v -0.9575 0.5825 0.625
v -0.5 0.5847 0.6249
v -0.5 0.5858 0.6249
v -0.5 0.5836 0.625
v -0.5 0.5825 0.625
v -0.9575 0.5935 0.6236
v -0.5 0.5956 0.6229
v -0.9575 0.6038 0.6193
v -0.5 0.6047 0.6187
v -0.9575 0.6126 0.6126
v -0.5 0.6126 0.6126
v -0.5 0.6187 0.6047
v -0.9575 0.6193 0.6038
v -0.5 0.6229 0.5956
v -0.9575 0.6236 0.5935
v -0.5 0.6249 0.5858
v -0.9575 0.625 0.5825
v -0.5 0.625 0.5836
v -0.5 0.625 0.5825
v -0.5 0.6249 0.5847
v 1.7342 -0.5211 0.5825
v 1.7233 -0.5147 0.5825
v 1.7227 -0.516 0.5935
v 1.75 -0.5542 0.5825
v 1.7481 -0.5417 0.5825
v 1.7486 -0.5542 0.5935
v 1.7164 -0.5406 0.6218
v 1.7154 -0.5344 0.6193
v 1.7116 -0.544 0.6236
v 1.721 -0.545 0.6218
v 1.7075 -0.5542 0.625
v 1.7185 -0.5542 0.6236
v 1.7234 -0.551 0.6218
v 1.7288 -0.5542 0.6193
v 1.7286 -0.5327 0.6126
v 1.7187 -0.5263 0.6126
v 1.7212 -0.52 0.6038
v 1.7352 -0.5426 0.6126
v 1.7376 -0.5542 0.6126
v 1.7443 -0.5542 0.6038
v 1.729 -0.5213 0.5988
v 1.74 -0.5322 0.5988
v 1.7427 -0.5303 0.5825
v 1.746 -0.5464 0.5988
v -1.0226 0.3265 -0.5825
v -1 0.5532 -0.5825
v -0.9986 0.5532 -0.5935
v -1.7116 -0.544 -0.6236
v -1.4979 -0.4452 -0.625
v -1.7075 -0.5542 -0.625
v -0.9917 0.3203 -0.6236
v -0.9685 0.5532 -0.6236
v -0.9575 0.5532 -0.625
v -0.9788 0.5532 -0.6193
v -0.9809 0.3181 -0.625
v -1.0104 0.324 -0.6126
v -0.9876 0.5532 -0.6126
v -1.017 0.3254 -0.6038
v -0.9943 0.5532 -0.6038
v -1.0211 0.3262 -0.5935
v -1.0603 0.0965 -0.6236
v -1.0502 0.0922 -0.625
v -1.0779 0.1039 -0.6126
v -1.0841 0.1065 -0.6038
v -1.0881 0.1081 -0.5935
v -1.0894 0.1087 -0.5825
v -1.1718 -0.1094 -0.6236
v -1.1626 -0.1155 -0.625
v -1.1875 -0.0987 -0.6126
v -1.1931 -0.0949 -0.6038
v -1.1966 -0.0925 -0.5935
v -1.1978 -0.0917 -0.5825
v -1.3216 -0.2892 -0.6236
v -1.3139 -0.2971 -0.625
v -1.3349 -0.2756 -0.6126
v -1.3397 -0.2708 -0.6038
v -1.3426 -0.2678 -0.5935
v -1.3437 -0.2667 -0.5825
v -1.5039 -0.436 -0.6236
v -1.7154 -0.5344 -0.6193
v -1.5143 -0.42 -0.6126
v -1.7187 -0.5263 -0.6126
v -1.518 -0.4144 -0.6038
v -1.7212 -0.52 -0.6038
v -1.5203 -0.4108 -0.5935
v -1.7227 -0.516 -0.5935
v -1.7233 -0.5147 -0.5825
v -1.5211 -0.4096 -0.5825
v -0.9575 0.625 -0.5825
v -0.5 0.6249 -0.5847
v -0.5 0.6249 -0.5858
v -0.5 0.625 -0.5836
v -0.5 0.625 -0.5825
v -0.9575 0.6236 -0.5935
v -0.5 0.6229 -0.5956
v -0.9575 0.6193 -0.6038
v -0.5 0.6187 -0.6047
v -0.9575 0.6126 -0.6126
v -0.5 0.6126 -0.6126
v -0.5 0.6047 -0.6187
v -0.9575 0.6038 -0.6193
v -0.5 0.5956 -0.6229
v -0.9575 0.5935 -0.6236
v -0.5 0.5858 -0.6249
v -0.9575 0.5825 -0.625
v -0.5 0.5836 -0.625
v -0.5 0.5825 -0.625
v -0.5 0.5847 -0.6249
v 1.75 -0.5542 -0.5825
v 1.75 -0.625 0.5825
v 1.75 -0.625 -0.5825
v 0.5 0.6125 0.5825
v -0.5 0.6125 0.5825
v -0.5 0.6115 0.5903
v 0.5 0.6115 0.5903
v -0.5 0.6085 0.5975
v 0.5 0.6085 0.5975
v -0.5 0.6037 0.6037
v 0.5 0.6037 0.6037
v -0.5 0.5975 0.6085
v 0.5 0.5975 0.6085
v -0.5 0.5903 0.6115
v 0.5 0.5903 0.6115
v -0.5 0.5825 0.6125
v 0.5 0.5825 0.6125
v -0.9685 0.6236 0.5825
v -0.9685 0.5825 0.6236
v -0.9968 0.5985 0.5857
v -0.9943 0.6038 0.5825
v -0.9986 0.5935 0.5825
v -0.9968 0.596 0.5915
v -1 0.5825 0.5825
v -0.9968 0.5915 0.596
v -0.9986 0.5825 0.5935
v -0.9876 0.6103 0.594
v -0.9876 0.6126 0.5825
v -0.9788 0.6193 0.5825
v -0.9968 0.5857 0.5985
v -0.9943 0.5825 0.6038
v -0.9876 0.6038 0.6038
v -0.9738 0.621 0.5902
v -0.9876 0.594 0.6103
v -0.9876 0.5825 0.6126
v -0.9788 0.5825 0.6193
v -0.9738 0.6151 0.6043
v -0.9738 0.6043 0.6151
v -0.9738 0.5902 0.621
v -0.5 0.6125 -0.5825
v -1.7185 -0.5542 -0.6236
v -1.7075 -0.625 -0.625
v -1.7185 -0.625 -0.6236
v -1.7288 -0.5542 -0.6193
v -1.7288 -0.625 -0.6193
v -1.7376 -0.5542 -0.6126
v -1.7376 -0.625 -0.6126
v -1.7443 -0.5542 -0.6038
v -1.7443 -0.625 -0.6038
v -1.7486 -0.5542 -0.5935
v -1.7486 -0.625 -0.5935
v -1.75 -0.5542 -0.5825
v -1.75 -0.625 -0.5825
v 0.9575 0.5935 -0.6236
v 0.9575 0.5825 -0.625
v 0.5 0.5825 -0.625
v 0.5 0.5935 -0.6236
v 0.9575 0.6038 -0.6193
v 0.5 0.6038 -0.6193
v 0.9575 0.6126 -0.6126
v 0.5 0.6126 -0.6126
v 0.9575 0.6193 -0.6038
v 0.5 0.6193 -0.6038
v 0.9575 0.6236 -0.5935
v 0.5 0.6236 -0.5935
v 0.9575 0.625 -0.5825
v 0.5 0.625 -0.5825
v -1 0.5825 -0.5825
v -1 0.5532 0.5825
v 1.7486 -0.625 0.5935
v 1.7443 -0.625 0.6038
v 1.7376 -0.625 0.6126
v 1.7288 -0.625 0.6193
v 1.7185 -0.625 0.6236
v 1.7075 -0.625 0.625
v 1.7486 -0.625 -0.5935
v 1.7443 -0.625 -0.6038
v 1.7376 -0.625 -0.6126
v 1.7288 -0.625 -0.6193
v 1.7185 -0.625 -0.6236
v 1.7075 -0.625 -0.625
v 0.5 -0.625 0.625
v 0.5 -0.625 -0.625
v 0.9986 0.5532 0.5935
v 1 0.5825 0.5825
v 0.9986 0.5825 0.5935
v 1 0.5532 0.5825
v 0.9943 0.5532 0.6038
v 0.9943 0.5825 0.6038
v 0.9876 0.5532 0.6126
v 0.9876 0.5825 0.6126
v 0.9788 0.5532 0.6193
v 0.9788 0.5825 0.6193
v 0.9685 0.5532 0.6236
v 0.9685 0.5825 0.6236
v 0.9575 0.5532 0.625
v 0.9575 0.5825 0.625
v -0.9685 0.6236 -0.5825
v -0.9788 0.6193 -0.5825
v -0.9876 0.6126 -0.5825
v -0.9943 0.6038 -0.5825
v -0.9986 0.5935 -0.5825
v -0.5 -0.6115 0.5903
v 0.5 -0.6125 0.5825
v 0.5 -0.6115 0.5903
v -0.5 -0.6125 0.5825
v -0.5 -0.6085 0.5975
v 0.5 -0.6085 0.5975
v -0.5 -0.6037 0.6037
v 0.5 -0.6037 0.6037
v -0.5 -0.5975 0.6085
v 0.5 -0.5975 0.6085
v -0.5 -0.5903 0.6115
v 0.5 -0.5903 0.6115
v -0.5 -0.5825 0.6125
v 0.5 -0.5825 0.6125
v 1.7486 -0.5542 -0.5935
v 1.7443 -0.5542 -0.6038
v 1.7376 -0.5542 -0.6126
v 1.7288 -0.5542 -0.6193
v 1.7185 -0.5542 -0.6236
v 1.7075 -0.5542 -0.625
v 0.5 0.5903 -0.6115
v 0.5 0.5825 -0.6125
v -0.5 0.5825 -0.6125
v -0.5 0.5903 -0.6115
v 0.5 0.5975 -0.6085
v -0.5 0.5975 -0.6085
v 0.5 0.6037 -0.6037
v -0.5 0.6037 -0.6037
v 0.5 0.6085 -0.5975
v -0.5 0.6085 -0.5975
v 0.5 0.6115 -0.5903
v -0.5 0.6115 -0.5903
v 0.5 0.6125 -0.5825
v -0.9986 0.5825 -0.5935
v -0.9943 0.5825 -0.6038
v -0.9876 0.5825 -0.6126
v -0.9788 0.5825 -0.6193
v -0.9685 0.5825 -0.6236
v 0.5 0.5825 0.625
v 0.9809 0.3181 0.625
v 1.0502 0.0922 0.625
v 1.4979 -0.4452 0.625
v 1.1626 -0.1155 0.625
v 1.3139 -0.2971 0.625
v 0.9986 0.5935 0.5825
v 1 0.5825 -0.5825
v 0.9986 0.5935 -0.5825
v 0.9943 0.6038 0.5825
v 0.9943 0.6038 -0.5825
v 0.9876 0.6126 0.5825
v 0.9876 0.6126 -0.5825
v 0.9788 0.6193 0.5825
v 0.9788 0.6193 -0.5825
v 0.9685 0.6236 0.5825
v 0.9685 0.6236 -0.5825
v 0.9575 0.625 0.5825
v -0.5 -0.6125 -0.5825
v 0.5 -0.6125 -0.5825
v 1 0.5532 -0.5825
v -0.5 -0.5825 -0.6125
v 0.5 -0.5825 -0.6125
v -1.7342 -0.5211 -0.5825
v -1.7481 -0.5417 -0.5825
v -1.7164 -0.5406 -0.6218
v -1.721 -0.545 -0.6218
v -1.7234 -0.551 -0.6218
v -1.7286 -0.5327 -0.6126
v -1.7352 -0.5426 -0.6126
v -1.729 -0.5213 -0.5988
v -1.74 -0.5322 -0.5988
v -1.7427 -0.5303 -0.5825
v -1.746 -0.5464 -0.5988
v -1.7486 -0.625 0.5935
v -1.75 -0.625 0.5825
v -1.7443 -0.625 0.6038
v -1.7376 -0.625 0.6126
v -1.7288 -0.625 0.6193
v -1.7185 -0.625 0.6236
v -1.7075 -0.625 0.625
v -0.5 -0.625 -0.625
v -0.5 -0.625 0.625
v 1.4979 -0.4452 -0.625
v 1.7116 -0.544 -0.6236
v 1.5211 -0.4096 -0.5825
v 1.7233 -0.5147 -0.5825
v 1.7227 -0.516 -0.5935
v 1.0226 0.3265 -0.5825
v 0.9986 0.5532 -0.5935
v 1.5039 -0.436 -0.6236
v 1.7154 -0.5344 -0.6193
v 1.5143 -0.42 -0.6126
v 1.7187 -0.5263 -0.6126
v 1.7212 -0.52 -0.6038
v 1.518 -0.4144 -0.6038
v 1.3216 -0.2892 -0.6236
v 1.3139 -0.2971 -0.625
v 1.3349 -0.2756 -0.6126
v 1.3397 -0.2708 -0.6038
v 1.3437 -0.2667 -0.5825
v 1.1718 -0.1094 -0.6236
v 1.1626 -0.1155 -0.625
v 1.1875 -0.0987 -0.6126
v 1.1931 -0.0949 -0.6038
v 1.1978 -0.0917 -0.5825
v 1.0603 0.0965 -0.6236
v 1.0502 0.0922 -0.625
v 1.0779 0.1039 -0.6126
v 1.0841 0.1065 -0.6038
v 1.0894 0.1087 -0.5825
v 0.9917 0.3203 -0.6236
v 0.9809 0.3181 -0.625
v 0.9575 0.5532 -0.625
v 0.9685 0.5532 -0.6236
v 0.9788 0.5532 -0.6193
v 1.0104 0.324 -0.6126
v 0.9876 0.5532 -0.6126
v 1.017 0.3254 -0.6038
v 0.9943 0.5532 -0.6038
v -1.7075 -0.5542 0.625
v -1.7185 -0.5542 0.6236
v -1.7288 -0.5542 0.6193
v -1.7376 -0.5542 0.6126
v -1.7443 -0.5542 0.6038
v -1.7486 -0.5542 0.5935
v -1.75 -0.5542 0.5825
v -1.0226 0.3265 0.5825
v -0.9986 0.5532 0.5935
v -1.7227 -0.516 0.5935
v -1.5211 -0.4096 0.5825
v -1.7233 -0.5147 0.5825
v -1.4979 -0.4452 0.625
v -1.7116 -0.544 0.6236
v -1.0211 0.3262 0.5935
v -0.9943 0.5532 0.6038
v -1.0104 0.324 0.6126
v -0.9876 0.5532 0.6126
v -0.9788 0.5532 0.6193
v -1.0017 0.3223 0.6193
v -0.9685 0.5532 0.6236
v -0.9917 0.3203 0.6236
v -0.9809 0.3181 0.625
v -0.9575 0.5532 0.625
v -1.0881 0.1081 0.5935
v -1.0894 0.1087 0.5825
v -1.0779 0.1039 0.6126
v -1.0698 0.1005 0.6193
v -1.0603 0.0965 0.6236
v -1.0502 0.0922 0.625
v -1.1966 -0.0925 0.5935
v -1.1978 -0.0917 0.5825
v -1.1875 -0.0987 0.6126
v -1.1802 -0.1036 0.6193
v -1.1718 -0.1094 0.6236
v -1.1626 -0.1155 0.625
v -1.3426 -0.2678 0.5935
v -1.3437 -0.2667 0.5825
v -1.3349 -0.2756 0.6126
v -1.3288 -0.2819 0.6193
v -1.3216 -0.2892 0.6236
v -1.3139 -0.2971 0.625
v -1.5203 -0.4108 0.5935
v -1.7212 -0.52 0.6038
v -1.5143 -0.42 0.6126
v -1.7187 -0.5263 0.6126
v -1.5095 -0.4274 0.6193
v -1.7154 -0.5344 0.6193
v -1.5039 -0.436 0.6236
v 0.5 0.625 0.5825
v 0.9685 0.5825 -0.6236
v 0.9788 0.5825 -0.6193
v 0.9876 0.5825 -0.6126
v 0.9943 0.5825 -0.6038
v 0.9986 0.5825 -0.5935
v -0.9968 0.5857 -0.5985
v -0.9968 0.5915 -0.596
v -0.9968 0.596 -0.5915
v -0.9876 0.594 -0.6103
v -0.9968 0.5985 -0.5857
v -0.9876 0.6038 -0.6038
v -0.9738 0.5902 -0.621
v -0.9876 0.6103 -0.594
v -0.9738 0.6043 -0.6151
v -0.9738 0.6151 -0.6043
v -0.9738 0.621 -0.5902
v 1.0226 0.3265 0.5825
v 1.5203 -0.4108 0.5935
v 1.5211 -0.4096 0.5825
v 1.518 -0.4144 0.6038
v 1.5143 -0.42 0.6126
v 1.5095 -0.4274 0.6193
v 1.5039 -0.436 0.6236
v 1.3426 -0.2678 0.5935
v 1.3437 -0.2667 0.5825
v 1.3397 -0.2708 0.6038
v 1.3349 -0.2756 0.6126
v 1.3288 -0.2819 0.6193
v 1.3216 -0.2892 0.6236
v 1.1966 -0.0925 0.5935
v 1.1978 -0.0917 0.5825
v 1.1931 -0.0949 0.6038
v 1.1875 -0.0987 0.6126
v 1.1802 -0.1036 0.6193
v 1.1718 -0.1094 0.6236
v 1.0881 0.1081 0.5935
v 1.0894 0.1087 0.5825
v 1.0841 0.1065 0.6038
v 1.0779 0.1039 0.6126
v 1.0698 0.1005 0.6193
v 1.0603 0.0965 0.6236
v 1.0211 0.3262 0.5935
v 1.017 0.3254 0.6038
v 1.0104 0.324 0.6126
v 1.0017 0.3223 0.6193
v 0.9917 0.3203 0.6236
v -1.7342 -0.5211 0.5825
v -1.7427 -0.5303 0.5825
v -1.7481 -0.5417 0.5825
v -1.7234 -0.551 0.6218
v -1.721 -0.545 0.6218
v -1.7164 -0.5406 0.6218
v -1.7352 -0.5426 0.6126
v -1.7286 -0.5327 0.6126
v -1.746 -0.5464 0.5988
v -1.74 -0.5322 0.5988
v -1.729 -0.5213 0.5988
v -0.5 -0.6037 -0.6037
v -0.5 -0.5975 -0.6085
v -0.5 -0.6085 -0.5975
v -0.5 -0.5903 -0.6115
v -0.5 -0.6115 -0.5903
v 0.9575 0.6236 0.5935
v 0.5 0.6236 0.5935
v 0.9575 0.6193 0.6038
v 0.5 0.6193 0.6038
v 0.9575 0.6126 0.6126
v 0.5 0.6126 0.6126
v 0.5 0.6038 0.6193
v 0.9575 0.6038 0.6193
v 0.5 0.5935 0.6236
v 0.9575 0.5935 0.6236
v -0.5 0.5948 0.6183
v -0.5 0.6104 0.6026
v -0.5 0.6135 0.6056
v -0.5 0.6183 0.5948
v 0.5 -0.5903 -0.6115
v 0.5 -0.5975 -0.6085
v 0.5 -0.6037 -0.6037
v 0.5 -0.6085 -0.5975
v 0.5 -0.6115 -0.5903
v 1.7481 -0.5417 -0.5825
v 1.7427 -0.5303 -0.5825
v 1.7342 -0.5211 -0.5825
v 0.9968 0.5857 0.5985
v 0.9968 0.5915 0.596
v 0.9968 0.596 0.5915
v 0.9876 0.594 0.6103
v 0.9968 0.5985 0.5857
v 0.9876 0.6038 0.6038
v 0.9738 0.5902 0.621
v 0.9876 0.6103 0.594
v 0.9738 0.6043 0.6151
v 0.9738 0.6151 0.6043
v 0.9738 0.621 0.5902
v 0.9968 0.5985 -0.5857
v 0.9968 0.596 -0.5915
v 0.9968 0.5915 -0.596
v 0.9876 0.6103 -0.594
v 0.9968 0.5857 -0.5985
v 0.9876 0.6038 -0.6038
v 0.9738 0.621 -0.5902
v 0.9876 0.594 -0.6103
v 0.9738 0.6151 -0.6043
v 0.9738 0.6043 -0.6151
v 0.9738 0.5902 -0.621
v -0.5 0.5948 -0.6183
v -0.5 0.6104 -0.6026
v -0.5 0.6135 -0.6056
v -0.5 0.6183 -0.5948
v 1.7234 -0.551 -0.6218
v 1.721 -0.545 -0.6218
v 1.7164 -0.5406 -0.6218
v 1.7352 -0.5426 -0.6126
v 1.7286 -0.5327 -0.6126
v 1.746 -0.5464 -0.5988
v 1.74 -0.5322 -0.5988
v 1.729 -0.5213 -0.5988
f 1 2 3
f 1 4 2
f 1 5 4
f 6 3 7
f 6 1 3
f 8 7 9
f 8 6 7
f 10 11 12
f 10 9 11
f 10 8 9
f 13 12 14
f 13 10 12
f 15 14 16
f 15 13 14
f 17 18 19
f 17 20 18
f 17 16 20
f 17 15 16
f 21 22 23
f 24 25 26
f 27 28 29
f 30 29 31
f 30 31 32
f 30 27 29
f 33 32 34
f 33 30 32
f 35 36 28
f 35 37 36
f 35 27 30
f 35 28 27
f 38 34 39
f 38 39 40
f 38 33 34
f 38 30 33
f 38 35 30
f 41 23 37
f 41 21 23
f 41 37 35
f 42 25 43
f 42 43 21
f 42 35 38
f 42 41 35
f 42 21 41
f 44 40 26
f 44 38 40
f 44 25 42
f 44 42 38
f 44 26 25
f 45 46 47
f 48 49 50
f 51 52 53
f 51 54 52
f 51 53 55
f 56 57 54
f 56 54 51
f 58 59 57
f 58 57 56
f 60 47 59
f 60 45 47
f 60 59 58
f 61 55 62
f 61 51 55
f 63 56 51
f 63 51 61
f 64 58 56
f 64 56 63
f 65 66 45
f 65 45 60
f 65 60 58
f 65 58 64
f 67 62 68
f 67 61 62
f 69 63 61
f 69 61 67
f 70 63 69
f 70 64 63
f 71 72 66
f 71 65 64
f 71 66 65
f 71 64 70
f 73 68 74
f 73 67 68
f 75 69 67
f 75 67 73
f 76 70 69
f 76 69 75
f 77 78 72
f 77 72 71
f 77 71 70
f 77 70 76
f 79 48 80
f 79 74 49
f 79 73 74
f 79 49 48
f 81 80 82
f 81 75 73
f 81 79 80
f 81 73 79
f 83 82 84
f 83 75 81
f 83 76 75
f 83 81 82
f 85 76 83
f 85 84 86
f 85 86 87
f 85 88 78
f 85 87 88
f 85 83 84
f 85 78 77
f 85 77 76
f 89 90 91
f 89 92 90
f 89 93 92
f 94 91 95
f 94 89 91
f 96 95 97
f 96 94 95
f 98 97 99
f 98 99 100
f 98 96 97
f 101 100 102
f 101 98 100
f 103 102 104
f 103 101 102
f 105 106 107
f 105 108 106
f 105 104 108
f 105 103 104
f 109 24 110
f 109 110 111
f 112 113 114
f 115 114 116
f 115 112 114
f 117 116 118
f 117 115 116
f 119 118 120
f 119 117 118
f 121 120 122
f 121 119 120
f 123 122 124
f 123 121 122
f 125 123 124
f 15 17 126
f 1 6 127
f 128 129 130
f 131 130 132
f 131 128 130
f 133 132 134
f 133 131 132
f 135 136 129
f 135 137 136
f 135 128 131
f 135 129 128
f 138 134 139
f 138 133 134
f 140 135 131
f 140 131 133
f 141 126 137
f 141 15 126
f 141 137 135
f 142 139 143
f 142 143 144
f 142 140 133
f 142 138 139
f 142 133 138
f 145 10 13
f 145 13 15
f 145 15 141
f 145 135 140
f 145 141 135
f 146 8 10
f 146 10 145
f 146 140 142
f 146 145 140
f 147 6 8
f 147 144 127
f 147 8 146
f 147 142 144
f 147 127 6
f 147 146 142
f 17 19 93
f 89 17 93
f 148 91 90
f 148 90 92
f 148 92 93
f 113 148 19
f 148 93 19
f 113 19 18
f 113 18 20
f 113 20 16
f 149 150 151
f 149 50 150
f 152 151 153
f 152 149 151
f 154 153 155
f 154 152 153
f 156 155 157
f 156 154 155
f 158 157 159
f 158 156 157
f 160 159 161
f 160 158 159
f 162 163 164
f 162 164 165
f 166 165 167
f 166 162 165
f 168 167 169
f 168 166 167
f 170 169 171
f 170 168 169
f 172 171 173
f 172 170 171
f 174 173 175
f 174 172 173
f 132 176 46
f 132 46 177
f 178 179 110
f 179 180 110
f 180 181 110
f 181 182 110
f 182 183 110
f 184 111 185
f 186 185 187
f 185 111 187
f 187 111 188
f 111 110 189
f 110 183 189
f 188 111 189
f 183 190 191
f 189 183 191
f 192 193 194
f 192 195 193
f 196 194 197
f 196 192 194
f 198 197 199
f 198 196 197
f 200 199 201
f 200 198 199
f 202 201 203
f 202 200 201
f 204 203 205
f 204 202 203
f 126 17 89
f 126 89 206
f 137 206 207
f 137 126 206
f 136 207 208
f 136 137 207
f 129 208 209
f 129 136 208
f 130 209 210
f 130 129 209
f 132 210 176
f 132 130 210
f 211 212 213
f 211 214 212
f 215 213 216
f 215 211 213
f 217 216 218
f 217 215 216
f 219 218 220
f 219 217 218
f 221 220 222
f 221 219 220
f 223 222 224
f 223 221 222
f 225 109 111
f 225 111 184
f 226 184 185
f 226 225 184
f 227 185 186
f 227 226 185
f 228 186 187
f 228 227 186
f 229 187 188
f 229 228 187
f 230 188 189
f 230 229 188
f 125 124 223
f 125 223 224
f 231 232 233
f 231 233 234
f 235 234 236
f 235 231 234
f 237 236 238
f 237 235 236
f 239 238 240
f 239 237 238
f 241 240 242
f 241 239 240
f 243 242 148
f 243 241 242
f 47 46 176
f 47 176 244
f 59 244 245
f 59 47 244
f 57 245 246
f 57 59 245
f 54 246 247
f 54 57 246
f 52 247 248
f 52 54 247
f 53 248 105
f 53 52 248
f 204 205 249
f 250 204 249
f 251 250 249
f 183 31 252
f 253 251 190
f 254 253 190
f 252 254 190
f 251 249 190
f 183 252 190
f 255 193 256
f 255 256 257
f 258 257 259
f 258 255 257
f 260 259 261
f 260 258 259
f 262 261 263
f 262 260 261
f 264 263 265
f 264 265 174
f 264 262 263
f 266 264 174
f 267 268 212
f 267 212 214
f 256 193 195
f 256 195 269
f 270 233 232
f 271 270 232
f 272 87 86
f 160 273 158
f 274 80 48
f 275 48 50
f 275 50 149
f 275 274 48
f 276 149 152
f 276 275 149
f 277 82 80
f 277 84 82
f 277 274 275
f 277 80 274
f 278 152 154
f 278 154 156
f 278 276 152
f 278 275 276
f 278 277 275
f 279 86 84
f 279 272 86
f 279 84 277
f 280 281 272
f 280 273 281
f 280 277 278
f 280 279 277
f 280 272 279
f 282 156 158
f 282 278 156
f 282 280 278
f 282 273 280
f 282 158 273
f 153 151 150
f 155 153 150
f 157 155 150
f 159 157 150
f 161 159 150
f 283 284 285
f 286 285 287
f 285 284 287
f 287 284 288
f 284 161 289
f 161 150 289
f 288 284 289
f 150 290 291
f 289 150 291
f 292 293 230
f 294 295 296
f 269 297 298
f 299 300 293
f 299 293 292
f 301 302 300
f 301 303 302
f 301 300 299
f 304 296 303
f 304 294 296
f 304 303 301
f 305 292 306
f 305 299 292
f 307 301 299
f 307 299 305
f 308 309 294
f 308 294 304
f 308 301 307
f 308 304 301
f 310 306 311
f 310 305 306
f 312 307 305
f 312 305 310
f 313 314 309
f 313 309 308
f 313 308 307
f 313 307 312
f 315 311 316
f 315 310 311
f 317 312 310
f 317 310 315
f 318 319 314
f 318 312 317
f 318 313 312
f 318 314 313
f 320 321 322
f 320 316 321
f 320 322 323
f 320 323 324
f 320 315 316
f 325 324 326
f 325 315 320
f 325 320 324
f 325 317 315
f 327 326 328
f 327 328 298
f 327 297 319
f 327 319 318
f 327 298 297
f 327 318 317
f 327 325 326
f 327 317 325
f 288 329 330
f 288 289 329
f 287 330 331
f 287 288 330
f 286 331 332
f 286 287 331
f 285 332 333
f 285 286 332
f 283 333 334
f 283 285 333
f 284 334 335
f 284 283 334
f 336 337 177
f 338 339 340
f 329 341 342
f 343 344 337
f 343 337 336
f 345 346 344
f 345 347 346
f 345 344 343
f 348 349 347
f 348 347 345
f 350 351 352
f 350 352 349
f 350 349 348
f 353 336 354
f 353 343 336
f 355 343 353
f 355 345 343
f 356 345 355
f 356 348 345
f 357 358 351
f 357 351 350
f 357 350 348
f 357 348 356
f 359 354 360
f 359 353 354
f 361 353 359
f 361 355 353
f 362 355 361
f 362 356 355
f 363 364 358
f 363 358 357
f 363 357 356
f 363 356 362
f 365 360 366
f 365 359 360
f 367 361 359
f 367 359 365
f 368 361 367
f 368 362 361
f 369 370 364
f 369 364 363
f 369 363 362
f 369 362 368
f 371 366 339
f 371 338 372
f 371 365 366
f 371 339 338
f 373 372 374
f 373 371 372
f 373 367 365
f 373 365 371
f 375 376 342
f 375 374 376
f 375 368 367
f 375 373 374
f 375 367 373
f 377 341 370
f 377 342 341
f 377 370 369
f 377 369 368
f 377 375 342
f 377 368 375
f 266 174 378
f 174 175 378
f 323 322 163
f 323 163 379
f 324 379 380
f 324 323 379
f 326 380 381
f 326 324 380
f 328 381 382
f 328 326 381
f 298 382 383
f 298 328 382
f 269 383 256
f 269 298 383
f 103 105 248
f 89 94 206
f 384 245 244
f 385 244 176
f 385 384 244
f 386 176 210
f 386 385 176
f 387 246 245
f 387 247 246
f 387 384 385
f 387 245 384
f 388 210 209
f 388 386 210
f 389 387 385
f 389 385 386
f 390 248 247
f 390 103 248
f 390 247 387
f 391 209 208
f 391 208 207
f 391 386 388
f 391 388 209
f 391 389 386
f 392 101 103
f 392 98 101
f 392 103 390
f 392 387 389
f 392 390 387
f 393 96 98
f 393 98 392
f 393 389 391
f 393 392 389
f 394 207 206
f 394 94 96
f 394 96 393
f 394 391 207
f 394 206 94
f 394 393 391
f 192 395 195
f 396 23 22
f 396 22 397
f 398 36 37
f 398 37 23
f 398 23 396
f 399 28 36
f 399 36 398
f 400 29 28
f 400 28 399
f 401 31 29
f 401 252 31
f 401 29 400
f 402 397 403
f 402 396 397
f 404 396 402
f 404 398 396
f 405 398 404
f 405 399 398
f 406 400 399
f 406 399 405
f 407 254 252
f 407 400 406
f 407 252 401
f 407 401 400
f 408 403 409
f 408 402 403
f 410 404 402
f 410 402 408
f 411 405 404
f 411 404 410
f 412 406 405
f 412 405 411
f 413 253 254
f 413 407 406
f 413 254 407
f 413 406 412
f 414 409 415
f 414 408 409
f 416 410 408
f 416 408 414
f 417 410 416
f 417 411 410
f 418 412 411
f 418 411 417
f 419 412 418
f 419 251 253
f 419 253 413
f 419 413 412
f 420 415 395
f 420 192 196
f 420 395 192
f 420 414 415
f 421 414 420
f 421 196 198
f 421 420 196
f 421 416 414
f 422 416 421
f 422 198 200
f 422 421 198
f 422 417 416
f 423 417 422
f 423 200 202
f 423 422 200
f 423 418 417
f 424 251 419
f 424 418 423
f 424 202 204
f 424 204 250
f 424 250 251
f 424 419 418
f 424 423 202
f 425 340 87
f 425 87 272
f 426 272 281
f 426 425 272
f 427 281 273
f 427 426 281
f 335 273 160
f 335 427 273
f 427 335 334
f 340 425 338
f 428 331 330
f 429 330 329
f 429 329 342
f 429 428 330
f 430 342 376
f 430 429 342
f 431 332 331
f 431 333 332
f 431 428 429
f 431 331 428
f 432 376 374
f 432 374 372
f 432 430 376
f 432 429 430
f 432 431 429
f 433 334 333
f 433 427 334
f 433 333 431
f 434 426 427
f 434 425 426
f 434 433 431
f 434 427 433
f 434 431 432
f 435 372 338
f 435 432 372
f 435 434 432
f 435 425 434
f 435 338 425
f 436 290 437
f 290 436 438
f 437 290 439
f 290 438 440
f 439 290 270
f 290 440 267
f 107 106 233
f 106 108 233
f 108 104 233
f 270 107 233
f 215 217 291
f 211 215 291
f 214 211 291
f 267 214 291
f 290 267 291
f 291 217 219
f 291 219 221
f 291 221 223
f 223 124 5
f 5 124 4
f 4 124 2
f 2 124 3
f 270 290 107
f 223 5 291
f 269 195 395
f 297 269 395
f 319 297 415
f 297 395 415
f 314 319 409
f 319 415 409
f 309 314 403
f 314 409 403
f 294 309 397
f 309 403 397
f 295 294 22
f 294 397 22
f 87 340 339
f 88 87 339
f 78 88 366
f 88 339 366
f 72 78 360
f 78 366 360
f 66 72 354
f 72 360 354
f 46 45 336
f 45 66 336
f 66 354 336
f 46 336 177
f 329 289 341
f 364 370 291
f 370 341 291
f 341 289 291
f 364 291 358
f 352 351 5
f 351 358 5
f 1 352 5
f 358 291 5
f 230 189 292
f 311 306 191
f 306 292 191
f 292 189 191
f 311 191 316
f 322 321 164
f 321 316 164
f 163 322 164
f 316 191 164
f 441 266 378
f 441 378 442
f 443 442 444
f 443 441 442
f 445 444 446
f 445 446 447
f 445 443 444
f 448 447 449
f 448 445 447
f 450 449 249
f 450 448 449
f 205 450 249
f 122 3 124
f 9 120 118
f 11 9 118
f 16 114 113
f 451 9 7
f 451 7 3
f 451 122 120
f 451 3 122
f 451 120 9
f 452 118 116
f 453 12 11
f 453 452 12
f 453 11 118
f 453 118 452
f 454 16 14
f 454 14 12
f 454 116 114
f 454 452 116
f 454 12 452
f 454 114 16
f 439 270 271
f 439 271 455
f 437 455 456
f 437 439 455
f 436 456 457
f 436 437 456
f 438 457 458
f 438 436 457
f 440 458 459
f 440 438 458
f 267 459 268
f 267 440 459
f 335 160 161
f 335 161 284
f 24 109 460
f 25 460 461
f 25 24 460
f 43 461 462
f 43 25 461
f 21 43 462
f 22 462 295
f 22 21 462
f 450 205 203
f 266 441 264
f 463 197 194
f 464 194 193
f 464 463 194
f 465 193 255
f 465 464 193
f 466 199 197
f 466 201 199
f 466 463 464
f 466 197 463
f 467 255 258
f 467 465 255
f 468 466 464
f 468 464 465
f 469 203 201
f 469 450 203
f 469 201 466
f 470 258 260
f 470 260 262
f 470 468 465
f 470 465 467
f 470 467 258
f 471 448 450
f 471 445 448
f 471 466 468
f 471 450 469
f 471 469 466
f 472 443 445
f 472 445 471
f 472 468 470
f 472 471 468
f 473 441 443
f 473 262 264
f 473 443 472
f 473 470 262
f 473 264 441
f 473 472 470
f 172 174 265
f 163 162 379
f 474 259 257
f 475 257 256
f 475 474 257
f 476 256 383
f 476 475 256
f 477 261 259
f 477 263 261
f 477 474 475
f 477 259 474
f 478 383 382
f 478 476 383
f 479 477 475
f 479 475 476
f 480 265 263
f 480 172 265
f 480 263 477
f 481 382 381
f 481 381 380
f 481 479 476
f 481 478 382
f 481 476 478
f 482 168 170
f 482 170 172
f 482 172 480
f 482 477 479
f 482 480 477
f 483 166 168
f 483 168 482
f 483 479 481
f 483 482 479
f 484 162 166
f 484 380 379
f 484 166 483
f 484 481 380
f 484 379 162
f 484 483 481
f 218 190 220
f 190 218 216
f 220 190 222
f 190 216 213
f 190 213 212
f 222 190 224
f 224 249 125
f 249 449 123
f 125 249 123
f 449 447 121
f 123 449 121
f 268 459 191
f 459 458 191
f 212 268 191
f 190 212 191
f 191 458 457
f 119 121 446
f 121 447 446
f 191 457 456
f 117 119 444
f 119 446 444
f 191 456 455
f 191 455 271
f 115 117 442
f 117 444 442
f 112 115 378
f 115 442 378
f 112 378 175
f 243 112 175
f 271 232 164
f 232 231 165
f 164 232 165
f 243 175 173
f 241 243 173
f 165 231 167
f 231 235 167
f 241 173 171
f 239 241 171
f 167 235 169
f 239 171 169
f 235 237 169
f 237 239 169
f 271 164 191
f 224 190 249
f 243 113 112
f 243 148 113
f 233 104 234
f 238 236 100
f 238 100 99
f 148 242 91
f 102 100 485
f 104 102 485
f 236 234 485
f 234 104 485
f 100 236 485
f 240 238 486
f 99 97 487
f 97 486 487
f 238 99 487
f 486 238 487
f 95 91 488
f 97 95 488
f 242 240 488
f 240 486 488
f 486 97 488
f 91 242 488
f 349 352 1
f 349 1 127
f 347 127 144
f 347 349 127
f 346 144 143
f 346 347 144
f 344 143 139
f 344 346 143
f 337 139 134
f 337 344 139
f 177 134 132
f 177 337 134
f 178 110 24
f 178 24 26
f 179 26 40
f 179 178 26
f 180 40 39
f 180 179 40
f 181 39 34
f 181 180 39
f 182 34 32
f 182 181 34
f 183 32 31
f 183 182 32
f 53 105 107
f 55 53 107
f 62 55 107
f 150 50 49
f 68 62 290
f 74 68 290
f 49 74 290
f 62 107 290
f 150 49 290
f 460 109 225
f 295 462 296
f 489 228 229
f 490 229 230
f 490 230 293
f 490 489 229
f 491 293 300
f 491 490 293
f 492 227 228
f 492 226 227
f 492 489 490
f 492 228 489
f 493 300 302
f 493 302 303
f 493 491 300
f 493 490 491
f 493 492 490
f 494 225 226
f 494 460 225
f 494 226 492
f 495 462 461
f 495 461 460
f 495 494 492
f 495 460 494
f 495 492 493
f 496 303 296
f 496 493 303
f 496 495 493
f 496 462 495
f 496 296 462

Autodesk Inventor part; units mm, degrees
ref_plane "YZ Plane" through (0, 0, 0) normal (1, 0, 0) x (0, 1, 0)
ref_plane "XZ Plane" through (0, 0, 0) normal (0, 1, 0) x (-1, 0, 0)
ref_plane "XY Plane" through (0, 0, 0) normal (0, 0, 1) x (1, 0, 0)
sketch "Sketch10" plane through (0, 0, 0) normal (0, 0, 1) x (1, 0, 0)
  line L0 (-0.5, 0.6125) -> (0.5, 0.6125)
  line L1 (0.5, 0.6125) -> (0.5, -0.6125)
  line L2 (0.5, -0.6125) -> (-0.5, -0.6125)
  line L3 (-0.5, -0.6125) -> (-0.5, 0.6125)
  point P0 (0, 0)
  point P1 (-0.5, 0)
  point P2 (0, 0.6125)
  dimension "d7" = 1
  dimension "d8" = 1.225
extrude "Extrusion4" add sketch "Sketch10" along normal mid plane 1.225
sketch "Sketch11" plane through (0.5, -0.6125, 0.6125) normal (1, 0, 0) x (0, 0, -1)
  line L0 (0, 1.225) -> (1.225, 1.225) construction
  line L1 (0, 0) -> (0, 1.225) construction
  line L2 (0, 0) -> (1.225, 0) construction
  line L3 (1.225, 1.225) -> (1.225, 0) construction
  line L4 (1.2375, 1.2375) -> (-0.0125, 1.2375)
  line L5 (-0.0125, 1.2375) -> (-0.0125, -0.0125)
  line L6 (-0.0125, -0.0125) -> (1.2375, -0.0125)
  line L7 (1.2375, -0.0125) -> (1.2375, 1.2375)
  line L8 (-0.0125, -0.0125) -> (1.2375, -0.0125)
  line L9 (1.2375, -0.0125) -> (1.2375, 0.0875)
  line L10 (1.2375, 0.0875) -> (-0.0125, 0.0875)
  line L11 (-0.0125, 0.0875) -> (-0.0125, -0.0125)
  point P0 (0.6125, 0.6125)
  dimension "d11" = 1.25
  dimension "d14" = 0.1
extrude "Extrusion5" add sketch "Sketch11" along normal blind 0.5
extrude "Extrusion6" add sketch "Sketch11" along normal blind 1.25 contours L7 L6 L5 L10
fillet "Fillet1" radius 1.15 1 edges at (1, -0.525, 0)
fillet "Fillet2" radius 0.0425 10 edges at (0.75, 0.625, -0.625) (0.75, 0.625, 0.625) (1, 0.5891, 0.625) (1.2059, -0.1035, 0.625) (1, 0.5891, -0.625) (1.2059, -0.1035, -0.625) (1.75, -0.575, -0.625) (1.75, -0.525, 0) (1, 0.625, 0) (1.75, -0.575, 0.625)
mirror "Mirror1" about plane through (0, 0, 0) normal (1, 0, 0) of "Extrusion5", "Fillet1", "Fillet2", "Extrusion6"
fillet "Fillet3" radius 0.03 4 edges at (0, 0.6125, -0.6125) (0, 0.6125, 0.6125) (0, -0.6125, -0.6125) (0, -0.6125, 0.6125)
properties part number "C0805C472KDRACTU Capacitor" material "Laminate, Ivory, Matte"
